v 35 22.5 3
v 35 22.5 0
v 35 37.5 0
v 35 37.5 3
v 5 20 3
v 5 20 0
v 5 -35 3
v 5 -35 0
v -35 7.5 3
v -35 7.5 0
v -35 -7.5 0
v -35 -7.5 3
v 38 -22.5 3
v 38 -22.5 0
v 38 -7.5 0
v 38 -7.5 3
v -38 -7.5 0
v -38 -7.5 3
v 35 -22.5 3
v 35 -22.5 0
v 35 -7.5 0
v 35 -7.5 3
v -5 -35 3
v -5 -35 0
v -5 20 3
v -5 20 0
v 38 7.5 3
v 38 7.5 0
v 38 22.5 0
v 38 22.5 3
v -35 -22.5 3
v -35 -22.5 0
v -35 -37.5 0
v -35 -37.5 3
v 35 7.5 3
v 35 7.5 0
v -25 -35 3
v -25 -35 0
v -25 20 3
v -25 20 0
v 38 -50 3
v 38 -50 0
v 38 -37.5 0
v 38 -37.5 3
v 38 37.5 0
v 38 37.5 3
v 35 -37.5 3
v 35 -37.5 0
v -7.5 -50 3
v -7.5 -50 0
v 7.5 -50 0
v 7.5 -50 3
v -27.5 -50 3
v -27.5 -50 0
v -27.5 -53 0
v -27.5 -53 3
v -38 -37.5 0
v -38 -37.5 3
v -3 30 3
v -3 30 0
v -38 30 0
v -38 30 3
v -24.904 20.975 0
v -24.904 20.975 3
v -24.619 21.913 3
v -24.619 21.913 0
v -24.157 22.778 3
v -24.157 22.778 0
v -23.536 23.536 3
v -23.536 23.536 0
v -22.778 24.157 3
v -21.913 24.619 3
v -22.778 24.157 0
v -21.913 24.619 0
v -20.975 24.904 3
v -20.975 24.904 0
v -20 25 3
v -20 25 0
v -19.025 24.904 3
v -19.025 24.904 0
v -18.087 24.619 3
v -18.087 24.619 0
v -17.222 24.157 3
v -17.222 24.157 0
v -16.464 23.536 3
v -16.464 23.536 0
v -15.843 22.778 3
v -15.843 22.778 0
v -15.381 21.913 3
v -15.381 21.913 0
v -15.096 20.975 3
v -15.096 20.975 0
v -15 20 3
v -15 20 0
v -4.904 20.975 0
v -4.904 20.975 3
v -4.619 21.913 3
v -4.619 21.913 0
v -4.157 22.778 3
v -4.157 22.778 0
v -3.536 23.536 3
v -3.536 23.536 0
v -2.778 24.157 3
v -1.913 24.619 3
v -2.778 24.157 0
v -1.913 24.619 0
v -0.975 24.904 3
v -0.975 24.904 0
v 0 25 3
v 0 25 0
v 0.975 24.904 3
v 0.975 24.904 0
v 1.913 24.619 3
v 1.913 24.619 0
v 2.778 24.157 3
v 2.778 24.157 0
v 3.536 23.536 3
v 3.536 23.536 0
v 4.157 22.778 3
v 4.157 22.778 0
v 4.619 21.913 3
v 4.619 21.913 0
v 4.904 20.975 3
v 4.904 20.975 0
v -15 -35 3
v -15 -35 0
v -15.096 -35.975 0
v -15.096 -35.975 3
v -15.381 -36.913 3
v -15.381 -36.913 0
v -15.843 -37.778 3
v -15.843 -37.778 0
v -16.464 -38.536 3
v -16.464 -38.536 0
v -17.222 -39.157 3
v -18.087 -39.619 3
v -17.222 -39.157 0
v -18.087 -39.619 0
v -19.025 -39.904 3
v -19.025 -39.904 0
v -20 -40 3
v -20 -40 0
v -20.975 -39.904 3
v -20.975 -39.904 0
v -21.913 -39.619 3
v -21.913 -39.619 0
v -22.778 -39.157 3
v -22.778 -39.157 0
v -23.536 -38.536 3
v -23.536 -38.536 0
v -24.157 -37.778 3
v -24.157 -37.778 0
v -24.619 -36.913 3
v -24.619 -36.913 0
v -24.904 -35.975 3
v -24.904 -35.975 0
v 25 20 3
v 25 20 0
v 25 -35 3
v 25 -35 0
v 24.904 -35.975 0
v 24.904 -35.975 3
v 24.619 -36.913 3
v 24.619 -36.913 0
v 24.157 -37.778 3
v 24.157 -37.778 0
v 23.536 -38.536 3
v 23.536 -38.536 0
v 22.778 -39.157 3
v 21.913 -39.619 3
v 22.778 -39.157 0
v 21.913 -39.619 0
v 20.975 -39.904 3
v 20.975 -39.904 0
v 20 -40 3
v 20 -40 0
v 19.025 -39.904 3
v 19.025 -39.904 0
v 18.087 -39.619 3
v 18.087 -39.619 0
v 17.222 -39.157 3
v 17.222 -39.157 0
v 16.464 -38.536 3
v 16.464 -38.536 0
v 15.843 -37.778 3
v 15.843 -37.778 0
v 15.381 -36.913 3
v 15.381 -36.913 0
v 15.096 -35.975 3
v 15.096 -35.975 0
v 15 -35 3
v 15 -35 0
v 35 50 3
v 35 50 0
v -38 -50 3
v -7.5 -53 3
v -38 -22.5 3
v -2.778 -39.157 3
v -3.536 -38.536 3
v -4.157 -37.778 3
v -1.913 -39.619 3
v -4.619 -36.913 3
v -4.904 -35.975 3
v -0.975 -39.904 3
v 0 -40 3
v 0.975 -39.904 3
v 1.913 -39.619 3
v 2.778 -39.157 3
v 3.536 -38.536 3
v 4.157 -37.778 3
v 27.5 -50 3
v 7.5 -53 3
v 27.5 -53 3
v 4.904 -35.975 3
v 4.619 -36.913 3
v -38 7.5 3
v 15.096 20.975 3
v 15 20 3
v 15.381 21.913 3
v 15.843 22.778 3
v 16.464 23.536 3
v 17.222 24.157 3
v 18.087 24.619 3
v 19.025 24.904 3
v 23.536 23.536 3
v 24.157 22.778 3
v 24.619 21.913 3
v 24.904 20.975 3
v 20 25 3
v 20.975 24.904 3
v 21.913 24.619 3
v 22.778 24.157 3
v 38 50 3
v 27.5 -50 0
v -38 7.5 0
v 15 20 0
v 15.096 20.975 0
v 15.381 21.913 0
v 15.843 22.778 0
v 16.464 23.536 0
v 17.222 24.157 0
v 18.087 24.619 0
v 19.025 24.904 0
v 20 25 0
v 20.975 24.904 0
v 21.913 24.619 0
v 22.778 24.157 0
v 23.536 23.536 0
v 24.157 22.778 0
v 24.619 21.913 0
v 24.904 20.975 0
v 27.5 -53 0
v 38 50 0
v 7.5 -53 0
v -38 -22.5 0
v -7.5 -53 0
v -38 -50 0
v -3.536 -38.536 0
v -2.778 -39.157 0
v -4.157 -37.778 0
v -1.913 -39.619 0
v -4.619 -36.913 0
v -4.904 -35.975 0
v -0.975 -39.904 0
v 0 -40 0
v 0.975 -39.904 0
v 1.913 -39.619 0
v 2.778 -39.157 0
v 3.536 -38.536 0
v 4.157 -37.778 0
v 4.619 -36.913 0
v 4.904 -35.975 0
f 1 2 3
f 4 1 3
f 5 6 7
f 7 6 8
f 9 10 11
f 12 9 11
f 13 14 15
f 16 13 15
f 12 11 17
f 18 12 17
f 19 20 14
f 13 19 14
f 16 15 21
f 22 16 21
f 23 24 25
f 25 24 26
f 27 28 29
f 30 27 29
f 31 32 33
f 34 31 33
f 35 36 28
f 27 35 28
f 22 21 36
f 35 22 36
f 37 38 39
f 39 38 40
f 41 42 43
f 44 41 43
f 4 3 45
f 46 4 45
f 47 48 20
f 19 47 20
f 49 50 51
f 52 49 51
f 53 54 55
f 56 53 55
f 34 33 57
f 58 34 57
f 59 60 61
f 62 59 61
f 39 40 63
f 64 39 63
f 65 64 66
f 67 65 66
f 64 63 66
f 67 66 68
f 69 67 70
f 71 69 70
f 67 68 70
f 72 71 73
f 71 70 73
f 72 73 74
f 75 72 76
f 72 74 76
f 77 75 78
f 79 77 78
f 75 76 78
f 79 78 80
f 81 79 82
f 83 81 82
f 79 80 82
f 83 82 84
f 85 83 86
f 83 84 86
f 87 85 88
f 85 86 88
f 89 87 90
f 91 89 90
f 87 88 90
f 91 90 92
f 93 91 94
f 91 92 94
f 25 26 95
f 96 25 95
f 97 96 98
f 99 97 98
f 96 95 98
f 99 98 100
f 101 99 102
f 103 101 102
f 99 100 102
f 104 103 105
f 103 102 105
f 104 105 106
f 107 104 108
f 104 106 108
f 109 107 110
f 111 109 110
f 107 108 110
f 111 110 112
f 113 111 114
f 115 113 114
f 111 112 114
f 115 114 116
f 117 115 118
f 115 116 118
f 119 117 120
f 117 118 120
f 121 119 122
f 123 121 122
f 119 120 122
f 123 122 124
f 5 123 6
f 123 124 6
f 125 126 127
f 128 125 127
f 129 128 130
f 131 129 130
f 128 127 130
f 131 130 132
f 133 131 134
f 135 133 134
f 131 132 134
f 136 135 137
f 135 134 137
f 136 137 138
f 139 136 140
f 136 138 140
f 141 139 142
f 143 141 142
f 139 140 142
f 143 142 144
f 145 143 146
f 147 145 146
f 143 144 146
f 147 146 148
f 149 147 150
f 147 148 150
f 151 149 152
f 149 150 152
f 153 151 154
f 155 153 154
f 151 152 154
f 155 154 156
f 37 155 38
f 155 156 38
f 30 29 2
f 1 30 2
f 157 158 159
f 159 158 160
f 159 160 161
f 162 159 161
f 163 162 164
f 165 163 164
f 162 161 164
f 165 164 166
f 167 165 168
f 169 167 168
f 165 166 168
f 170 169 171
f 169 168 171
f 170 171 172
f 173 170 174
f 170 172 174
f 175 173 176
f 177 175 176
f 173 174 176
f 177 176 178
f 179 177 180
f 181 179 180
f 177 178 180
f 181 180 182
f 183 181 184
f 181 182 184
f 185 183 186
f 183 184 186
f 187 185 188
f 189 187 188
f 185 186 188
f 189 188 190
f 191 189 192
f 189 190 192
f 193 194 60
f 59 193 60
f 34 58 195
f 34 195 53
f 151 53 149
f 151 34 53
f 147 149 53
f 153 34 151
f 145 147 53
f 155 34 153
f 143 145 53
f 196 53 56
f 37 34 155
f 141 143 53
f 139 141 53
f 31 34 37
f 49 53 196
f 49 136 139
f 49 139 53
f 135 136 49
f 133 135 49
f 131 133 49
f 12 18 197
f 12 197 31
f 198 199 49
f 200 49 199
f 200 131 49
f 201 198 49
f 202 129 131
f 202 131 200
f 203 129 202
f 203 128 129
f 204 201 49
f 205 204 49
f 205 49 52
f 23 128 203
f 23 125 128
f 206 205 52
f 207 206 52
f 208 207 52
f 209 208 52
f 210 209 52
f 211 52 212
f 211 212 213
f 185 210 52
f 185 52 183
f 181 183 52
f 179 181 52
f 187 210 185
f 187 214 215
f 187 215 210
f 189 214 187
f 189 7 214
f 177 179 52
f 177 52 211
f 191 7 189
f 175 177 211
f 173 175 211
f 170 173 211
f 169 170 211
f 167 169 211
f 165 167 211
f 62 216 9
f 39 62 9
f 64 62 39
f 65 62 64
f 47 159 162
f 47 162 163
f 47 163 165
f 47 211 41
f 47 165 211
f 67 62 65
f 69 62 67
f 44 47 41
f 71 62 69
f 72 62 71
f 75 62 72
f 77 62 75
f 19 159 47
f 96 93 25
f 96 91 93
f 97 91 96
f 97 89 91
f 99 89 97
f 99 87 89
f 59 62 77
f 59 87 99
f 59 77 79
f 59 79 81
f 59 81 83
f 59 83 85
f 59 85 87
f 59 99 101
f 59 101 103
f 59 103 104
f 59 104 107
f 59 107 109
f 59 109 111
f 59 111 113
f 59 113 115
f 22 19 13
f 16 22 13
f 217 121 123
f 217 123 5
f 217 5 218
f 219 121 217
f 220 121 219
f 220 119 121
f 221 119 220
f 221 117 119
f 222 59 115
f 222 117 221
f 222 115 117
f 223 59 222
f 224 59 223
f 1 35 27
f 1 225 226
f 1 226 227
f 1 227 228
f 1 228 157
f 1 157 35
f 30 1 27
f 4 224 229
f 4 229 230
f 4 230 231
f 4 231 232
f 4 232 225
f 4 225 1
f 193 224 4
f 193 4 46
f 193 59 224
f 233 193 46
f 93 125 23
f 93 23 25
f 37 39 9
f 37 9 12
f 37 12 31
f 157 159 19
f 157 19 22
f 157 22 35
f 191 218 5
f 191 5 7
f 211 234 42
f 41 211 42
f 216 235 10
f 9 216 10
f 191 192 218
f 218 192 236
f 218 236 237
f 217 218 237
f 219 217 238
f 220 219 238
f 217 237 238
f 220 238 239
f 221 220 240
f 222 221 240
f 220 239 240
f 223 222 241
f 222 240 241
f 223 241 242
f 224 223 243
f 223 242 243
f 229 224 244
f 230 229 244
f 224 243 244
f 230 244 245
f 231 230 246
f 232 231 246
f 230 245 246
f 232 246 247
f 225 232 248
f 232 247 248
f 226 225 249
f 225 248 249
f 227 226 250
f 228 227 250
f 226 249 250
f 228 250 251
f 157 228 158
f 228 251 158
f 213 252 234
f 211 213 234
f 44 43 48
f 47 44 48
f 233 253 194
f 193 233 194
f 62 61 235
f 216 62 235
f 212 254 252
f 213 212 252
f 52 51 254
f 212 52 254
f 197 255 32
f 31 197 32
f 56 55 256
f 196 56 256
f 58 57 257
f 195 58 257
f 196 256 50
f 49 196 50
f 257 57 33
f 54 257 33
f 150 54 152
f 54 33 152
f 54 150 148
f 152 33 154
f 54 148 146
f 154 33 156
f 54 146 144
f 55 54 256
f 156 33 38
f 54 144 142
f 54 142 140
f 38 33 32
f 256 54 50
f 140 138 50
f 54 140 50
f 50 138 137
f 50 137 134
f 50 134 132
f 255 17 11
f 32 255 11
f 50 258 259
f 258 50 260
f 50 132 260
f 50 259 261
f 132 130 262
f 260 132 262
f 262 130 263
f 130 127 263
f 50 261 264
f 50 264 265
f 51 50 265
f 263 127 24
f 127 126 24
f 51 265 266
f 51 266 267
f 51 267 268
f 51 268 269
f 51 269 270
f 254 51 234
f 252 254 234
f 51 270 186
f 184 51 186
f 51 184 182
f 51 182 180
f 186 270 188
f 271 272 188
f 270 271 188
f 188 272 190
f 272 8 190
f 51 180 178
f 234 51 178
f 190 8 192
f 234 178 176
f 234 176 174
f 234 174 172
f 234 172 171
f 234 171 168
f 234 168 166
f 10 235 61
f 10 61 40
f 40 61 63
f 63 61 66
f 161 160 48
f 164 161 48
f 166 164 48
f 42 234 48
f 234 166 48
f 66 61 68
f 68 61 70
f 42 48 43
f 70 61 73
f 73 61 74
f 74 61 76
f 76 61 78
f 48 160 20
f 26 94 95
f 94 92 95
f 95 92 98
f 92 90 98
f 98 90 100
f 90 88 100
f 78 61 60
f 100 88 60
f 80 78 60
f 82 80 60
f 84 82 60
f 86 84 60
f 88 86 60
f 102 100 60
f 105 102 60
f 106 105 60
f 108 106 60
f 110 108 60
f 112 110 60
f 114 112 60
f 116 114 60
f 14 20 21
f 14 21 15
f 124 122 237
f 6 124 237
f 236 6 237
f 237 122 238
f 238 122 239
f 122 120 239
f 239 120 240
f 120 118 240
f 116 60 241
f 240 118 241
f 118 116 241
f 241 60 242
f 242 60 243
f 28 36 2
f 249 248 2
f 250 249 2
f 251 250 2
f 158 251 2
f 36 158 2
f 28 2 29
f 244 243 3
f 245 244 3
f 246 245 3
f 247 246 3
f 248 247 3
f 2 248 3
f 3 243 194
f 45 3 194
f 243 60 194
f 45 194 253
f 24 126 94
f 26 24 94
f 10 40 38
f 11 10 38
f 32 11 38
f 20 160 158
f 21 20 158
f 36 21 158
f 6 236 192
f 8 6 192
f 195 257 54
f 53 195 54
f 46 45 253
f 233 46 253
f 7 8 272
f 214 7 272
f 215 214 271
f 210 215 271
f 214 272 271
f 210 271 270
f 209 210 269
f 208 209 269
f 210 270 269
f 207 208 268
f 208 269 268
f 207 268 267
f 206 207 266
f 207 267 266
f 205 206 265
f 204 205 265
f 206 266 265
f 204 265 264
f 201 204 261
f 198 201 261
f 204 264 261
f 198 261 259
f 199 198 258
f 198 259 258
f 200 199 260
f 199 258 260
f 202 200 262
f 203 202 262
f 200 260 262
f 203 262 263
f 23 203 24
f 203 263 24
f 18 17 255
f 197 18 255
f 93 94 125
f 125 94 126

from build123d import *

# Parameters (mm, degrees)
BOSS_EXTRUDE1_DEPTH = 3


with BuildPart() as part:
    # Sketch1 → Boss-Extrude1 (new body)
    with BuildSketch(Plane.XY):
        Polygon((35, 50), (-3, 30), (-38, 30), (-38, 7.5), (-35, 7.5), (-35, -7.5), (-38, -7.5), (-38, -22.5), (-35, -22.5), (-35, -37.5), (-38, -37.5), (-38, -50), (-27.5, -50), (-27.5, -53), (-7.5, -53), (-7.5, -50), (7.5, -50), (7.5, -53), (27.5, -53), (27.5, -50), (38, -50), (38, -37.5), (35, -37.5), (35, -22.5), (38, -22.5), (38, -7.5), (35, -7.5), (35, 7.5), (38, 7.5), (38, 22.5), (35, 22.5), (35, 37.5), (38, 37.5), (38, 50), align=None)
        with BuildLine():
            Line((-15, 20), (-15, -35))
            ThreePointArc((-15, -35), (-20, -40), (-25, -35))
            Line((-25, -35), (-25, 20))
            ThreePointArc((-25, 20), (-20, 25), (-15, 20))
        make_face(mode=Mode.SUBTRACT)
        with BuildLine():
            ThreePointArc((5, -35), (0, -40), (-5, -35))
            Line((-5, -35), (-5, 20))
            ThreePointArc((-5, 20), (0, 25), (5, 20))
            Line((5, 20), (5, -35))
        make_face(mode=Mode.SUBTRACT)
        with BuildLine():
            ThreePointArc((25, -35), (20, -40), (15, -35))
            Line((15, -35), (15, 20))
            ThreePointArc((15, 20), (20, 25), (25, 20))
            Line((25, 20), (25, -35))
        make_face(mode=Mode.SUBTRACT)
    extrude(amount=BOSS_EXTRUDE1_DEPTH)


solid = part.part
